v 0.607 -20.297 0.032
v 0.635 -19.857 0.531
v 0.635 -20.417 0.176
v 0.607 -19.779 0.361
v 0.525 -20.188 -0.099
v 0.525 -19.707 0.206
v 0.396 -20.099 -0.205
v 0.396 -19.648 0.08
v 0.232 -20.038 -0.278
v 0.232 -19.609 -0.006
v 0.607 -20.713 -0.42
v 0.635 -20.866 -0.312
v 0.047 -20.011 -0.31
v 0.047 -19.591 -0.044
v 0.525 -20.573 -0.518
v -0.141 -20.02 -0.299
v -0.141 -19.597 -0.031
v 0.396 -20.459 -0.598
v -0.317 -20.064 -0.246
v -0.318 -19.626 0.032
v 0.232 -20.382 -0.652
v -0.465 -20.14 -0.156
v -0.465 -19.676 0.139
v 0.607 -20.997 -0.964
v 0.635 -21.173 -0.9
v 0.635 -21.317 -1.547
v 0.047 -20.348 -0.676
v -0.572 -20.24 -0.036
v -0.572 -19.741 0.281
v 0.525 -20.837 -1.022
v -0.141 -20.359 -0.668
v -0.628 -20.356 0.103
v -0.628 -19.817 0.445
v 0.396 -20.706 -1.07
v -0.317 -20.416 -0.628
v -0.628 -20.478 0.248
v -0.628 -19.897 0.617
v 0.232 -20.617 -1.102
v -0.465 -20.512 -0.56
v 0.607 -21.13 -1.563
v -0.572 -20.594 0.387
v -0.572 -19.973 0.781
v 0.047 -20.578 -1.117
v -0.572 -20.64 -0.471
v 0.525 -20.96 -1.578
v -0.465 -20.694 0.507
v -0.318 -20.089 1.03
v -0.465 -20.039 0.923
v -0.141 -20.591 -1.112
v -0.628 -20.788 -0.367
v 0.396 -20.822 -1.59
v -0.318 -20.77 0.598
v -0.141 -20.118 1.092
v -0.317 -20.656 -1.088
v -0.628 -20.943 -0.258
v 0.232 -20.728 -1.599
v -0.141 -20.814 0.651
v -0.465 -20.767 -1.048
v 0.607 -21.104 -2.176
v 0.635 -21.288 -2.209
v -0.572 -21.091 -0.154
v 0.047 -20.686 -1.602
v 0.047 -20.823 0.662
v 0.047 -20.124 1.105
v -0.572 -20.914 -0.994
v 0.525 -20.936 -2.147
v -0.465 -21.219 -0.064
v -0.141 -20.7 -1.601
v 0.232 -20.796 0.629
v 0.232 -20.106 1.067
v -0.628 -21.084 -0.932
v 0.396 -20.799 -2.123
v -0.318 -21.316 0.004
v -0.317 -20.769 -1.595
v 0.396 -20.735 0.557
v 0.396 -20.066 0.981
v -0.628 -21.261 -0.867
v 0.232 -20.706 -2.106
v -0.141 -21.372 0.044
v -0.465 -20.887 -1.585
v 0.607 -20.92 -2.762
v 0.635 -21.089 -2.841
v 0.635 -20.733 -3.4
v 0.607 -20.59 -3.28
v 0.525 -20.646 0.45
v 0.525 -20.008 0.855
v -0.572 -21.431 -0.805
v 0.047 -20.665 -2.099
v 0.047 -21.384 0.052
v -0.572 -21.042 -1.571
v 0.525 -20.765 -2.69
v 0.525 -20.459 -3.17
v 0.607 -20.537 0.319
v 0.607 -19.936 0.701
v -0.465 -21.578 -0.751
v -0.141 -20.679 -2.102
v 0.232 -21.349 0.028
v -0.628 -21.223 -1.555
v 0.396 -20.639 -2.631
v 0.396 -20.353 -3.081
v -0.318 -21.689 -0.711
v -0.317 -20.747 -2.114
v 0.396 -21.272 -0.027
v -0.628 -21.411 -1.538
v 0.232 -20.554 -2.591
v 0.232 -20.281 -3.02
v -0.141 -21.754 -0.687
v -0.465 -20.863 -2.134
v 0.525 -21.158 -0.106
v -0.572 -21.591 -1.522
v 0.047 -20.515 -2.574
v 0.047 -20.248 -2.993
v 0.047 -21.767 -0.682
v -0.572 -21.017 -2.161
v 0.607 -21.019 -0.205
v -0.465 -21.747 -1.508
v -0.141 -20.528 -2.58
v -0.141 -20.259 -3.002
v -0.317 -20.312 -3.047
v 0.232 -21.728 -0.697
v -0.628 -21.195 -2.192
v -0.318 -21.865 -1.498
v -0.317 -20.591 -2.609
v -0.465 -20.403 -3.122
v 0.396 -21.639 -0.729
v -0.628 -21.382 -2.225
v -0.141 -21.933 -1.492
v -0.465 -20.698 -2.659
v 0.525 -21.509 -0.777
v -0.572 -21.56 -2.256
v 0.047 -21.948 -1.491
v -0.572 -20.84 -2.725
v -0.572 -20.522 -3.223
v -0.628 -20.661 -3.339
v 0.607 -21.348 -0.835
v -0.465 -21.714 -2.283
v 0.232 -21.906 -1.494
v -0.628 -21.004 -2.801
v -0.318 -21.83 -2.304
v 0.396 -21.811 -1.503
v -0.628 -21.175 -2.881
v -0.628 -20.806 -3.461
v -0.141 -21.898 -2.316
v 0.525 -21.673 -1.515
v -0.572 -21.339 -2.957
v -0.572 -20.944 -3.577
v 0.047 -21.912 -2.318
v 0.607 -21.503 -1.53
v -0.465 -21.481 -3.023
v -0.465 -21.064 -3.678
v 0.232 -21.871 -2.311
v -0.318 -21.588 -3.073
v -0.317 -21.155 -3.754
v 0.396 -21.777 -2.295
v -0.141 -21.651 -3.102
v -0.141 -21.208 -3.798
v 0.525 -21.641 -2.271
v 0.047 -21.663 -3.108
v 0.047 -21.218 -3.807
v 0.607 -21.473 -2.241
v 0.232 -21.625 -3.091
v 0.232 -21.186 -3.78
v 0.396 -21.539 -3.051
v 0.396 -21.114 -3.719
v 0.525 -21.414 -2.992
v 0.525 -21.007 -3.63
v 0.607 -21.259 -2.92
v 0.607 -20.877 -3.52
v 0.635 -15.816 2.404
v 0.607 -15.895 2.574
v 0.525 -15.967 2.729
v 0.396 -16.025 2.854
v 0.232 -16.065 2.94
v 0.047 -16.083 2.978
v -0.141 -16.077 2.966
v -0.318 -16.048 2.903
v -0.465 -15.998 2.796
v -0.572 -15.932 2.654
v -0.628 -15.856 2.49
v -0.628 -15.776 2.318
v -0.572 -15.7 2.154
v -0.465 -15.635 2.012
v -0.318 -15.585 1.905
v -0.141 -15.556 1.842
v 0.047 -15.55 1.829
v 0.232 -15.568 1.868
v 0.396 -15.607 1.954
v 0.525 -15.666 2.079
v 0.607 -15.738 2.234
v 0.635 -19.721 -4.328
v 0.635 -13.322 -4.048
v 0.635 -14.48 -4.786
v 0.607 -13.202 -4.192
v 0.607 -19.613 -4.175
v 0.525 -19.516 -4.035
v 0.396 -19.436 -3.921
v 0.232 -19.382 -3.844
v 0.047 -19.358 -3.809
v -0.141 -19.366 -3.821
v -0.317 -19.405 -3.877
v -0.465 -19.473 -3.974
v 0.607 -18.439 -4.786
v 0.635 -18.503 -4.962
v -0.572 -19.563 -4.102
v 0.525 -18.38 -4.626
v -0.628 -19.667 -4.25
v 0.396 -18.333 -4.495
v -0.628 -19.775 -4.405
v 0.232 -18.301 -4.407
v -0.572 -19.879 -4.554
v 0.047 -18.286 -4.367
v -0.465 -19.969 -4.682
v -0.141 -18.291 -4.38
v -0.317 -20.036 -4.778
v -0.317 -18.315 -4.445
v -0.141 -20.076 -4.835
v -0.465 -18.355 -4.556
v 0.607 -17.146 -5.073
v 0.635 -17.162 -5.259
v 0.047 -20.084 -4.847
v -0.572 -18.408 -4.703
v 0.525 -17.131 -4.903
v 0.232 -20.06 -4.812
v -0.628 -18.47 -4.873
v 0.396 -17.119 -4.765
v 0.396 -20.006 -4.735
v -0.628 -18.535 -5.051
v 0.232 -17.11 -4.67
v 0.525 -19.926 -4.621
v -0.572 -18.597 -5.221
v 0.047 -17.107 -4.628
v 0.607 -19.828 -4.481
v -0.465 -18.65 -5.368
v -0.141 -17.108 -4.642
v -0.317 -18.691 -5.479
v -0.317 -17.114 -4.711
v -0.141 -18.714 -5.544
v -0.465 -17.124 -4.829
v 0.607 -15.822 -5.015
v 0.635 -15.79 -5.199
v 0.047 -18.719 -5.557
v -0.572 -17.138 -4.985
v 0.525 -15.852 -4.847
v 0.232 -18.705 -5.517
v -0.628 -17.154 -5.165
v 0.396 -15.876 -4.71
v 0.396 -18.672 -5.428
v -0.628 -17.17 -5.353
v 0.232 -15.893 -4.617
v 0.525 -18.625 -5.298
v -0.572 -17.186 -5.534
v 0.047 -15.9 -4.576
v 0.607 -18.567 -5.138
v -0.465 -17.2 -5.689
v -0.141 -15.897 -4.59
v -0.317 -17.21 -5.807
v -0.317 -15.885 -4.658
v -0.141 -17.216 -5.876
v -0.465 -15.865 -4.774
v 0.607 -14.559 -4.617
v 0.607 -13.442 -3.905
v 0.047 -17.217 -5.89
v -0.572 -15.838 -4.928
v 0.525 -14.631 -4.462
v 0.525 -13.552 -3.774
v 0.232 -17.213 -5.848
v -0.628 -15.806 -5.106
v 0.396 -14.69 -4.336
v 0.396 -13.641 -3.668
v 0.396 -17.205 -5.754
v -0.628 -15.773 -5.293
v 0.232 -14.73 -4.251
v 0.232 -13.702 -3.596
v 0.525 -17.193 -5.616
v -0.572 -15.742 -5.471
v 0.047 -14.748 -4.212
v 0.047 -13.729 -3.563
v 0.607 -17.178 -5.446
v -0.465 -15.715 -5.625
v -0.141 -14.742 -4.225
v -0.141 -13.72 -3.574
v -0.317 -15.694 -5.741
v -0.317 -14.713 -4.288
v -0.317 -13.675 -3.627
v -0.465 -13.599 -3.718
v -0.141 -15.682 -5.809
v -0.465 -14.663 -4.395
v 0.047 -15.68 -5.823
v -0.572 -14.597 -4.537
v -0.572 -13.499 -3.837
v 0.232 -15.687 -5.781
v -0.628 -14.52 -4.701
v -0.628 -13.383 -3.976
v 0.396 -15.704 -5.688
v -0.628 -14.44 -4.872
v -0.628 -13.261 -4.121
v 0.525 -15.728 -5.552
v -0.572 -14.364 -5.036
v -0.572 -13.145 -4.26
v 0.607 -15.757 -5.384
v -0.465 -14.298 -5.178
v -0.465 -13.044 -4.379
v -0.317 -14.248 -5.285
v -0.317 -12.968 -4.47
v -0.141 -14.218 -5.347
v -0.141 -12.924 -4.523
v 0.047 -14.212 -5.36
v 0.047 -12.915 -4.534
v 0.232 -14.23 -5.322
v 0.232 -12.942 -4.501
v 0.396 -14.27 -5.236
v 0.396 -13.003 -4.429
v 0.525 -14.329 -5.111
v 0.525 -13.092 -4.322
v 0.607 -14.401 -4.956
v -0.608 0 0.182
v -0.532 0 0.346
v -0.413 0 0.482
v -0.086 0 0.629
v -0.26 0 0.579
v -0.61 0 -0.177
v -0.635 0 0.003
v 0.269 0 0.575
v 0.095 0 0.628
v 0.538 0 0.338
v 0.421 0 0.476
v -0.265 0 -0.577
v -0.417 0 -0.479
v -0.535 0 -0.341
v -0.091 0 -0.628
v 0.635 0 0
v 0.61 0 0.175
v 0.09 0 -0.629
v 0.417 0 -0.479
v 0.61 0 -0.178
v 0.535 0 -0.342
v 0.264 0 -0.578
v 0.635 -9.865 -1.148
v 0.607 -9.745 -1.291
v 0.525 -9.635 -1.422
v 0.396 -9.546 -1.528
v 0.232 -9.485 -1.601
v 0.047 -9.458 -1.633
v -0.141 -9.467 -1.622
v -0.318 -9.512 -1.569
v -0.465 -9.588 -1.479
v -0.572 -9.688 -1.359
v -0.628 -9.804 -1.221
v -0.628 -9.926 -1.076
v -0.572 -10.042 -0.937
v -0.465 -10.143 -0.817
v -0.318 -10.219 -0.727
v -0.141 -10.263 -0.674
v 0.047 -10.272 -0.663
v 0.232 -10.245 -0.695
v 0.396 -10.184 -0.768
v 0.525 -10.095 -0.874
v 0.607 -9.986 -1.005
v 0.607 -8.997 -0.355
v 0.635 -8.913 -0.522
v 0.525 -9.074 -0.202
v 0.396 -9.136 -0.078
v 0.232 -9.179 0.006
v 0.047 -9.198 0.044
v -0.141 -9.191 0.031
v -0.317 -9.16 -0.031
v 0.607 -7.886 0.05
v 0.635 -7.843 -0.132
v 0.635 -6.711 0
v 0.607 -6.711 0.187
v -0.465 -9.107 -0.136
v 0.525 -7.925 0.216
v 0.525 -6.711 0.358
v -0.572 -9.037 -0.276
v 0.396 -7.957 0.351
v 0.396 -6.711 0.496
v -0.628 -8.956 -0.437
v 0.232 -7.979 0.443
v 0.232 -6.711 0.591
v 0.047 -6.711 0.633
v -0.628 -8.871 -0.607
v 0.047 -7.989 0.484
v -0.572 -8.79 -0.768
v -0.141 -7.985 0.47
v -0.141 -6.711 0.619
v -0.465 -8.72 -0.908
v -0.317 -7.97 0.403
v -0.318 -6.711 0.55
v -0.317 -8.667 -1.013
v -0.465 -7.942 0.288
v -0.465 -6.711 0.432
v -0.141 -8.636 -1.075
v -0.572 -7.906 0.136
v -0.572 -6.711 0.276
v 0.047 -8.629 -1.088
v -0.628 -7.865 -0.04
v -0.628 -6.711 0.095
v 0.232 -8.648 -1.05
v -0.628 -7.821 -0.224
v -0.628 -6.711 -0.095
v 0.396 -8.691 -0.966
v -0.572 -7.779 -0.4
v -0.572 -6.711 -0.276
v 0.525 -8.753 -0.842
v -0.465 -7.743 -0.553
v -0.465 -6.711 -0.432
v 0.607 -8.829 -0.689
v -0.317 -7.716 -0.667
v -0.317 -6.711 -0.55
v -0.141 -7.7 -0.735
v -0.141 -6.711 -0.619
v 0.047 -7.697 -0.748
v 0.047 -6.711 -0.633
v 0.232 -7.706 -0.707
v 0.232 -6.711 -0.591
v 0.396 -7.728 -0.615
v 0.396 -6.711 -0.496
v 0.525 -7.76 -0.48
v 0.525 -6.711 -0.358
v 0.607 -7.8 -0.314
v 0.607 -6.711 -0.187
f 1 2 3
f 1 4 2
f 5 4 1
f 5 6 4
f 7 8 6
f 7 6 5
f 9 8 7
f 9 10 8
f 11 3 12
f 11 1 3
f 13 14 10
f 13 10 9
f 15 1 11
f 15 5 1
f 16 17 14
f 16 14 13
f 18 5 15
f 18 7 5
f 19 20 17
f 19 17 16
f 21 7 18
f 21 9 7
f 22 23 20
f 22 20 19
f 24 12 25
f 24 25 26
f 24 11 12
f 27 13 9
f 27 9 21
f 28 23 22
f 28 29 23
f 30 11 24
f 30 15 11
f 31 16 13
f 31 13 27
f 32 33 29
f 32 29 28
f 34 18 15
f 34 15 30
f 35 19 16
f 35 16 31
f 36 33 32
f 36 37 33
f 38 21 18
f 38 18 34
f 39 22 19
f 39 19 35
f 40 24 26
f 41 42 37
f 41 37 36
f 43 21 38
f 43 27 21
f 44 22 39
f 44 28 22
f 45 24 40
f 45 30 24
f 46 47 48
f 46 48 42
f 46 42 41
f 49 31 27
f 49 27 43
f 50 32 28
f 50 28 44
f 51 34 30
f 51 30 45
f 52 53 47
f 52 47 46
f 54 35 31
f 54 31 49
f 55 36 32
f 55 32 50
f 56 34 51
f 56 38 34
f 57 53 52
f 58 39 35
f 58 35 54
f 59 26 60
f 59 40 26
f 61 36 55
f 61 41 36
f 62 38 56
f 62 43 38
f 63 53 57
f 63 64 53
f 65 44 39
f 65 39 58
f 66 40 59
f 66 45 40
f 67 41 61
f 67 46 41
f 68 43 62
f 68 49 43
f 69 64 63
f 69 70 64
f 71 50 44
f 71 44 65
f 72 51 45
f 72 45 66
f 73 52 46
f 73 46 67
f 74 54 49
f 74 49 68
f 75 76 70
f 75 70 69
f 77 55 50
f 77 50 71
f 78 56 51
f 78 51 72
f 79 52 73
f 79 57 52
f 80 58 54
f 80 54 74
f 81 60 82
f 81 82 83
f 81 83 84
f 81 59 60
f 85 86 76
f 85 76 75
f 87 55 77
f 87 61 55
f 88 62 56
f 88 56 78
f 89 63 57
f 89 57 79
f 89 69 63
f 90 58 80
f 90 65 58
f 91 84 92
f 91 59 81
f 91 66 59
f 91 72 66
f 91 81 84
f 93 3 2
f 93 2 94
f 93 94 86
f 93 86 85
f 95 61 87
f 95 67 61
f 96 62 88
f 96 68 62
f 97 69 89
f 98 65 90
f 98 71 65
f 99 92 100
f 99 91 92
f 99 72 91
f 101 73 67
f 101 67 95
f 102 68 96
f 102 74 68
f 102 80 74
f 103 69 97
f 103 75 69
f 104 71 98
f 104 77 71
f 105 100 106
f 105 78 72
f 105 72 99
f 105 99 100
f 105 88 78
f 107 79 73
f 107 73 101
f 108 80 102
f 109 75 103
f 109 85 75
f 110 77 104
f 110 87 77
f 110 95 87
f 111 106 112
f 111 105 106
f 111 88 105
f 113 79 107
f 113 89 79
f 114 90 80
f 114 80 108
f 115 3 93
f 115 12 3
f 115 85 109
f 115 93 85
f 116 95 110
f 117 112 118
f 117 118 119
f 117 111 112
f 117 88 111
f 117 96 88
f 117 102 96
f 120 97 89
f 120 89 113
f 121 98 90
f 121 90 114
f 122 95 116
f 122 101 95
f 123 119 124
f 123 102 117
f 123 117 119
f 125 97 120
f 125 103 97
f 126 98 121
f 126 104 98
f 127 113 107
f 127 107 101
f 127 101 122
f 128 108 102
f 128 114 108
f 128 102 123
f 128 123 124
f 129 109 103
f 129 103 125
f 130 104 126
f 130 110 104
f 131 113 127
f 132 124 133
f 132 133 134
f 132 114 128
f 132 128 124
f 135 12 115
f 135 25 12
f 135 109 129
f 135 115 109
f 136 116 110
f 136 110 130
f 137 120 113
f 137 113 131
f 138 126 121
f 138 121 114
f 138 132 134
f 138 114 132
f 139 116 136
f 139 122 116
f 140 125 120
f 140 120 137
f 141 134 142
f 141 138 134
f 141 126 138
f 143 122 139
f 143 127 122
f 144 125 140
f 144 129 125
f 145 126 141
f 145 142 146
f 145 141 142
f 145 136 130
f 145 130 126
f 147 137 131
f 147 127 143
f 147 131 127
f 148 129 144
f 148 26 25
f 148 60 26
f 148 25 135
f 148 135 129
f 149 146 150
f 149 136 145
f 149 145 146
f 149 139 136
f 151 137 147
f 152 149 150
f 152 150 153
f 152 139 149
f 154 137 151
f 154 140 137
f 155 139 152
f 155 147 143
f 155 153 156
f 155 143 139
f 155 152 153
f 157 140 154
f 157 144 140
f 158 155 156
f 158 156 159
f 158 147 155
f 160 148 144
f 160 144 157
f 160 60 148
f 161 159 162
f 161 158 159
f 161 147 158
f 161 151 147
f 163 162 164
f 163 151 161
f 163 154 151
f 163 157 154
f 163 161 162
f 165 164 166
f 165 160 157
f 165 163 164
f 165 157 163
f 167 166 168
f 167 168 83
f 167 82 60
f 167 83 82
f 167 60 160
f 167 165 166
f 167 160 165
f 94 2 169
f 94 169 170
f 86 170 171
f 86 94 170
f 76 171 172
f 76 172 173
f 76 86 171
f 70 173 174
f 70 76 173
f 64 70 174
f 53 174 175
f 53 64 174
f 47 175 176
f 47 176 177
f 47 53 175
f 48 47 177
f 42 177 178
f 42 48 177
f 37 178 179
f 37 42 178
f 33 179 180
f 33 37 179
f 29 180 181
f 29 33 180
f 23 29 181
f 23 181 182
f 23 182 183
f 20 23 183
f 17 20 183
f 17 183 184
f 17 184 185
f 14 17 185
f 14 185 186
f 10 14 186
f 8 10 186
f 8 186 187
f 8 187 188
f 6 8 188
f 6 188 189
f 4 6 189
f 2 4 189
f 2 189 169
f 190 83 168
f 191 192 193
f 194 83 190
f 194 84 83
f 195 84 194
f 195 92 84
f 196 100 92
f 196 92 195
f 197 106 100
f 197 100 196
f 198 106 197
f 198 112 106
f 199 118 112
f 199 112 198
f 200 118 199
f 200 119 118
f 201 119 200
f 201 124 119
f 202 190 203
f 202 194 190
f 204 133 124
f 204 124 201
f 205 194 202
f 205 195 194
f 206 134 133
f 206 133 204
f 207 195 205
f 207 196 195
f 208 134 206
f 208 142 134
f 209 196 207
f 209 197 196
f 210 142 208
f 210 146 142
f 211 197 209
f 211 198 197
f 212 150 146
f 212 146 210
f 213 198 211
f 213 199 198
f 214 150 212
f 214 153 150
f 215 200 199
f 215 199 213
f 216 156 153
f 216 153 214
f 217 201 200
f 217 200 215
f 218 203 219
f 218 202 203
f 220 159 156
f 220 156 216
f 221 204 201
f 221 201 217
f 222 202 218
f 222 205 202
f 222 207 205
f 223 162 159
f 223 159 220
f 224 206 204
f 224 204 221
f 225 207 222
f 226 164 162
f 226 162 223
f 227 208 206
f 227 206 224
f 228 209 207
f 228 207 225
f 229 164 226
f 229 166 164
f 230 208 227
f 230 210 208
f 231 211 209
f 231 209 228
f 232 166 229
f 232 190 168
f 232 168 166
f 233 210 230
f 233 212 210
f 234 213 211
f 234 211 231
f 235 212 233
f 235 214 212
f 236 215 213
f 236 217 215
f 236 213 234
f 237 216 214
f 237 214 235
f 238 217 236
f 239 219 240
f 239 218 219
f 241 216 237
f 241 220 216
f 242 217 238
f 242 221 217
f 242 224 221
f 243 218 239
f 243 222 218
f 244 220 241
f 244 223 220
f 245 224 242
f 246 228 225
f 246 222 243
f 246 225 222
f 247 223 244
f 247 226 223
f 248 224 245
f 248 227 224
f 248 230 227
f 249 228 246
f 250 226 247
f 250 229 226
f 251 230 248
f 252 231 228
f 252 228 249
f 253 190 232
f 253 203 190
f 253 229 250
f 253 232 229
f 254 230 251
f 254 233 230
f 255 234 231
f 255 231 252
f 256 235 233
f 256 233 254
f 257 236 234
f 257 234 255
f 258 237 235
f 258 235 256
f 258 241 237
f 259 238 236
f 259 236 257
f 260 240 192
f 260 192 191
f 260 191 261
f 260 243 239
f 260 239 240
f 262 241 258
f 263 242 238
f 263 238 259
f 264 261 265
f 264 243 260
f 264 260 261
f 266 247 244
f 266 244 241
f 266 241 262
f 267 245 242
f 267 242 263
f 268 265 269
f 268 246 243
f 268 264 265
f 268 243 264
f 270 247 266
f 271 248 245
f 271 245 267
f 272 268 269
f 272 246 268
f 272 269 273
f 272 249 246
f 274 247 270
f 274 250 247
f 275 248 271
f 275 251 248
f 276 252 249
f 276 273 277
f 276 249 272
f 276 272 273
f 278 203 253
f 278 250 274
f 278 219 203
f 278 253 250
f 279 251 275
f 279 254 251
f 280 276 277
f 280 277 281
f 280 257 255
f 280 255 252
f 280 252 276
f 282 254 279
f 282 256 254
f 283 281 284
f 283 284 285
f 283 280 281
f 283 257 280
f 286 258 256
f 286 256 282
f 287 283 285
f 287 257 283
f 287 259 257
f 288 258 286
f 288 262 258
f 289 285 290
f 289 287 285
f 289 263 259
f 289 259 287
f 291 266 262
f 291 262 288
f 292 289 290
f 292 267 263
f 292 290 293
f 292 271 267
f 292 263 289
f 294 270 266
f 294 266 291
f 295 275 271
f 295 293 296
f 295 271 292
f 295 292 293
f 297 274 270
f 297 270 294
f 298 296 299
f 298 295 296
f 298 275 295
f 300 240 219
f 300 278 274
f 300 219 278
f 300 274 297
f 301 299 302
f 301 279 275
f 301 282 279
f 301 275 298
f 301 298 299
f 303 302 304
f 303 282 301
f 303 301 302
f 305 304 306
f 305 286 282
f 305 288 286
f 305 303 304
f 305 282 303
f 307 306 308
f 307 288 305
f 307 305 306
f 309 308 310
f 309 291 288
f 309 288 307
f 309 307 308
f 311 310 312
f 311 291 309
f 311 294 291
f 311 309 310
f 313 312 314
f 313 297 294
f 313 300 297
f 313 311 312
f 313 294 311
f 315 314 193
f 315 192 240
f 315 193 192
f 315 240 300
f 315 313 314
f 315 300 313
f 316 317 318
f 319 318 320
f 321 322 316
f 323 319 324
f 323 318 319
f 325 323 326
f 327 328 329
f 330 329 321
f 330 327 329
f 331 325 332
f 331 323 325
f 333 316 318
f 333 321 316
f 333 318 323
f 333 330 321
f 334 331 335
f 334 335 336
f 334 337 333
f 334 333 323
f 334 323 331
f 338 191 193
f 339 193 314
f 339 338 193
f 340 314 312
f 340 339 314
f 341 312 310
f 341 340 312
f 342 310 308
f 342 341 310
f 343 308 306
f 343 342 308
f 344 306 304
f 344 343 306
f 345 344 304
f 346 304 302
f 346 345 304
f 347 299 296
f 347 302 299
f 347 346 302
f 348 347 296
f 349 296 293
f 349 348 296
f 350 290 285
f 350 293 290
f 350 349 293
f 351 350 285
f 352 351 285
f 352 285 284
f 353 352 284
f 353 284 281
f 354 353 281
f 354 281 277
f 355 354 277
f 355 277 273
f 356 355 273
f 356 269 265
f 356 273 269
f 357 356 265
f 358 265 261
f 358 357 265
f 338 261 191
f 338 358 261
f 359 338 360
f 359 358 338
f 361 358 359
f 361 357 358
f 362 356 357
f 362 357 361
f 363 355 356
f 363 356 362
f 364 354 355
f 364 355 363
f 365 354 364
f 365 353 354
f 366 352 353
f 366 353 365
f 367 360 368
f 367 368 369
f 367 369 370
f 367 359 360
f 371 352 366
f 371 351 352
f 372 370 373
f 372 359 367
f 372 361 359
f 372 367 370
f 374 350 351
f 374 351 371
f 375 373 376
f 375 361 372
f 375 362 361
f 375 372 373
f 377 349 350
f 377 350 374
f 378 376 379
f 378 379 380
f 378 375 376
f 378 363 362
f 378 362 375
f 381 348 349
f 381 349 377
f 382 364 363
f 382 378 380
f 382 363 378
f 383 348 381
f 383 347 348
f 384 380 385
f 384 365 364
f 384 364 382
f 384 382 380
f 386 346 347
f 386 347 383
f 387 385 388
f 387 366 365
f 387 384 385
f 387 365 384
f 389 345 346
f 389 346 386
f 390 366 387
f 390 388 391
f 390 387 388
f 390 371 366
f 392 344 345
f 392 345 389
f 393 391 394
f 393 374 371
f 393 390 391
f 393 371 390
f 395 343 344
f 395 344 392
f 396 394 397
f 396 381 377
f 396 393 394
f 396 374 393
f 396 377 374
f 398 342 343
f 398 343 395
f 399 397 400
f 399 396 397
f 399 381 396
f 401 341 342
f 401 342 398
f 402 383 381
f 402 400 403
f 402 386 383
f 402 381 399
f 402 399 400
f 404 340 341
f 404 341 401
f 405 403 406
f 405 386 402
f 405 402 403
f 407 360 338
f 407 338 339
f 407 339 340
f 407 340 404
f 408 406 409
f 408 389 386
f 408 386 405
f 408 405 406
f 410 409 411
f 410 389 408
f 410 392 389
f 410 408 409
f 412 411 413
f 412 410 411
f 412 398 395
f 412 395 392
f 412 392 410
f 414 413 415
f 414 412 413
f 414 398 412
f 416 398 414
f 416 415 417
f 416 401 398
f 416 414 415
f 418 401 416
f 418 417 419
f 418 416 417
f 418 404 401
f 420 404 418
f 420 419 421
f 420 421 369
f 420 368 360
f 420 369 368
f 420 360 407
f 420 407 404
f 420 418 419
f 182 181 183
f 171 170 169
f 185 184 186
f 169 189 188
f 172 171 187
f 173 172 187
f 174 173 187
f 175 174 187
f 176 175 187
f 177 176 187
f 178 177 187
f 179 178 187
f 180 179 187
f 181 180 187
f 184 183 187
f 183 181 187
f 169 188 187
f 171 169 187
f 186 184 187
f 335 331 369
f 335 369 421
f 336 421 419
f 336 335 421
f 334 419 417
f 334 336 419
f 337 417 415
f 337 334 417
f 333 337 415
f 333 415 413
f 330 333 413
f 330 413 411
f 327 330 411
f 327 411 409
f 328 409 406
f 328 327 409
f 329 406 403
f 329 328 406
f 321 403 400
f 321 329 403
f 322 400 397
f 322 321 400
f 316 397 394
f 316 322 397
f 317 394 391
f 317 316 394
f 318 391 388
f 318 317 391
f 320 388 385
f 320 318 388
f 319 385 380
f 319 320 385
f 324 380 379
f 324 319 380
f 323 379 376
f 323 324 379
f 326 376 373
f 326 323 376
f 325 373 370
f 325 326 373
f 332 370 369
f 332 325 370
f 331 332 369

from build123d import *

# Parameters (mm, degrees)
SKETCH2_R = 0.635


with BuildPart() as part:
    # Sweep1: sweep along a path in Sketch1
    with BuildLine(Plane(origin=(0, 0, 0), x_dir=(0, 0, -1), z_dir=(1, 0, 0))) as sweep1_path:
        Line((-2.403997938, -15.816263763), (-0.530715835, -19.857293072))
        ThreePointArc((-0.530715835, -19.857293072), (1.218329614, -21.26591989), (3.400020828, -20.73336666))
        ThreePointArc((3.400020828, -20.73336666), (5.25921097, -17.161895627), (4.04844554, -13.321838283))
        Line((4.04844554, -13.321838283), (1.148017974, -9.865243311))
        ThreePointArc((1.148017974, -9.865243311), (0.295927809, -8.389379852), (0, -6.71108985))
        add(Edge.make_bspline(
            [(0, -6.71108985), (0, 0)],
            knots=[0, 0, 1, 1], degree=1))
    # Sketch2 → Sweep1 (sweep)
    with BuildSketch(Plane(origin=(0, 0, 0), x_dir=(1, 0, 0), z_dir=(0, 1, 0))):
        Circle(SKETCH2_R)
    sweep(path=sweep1_path.line)


solid = part.part
